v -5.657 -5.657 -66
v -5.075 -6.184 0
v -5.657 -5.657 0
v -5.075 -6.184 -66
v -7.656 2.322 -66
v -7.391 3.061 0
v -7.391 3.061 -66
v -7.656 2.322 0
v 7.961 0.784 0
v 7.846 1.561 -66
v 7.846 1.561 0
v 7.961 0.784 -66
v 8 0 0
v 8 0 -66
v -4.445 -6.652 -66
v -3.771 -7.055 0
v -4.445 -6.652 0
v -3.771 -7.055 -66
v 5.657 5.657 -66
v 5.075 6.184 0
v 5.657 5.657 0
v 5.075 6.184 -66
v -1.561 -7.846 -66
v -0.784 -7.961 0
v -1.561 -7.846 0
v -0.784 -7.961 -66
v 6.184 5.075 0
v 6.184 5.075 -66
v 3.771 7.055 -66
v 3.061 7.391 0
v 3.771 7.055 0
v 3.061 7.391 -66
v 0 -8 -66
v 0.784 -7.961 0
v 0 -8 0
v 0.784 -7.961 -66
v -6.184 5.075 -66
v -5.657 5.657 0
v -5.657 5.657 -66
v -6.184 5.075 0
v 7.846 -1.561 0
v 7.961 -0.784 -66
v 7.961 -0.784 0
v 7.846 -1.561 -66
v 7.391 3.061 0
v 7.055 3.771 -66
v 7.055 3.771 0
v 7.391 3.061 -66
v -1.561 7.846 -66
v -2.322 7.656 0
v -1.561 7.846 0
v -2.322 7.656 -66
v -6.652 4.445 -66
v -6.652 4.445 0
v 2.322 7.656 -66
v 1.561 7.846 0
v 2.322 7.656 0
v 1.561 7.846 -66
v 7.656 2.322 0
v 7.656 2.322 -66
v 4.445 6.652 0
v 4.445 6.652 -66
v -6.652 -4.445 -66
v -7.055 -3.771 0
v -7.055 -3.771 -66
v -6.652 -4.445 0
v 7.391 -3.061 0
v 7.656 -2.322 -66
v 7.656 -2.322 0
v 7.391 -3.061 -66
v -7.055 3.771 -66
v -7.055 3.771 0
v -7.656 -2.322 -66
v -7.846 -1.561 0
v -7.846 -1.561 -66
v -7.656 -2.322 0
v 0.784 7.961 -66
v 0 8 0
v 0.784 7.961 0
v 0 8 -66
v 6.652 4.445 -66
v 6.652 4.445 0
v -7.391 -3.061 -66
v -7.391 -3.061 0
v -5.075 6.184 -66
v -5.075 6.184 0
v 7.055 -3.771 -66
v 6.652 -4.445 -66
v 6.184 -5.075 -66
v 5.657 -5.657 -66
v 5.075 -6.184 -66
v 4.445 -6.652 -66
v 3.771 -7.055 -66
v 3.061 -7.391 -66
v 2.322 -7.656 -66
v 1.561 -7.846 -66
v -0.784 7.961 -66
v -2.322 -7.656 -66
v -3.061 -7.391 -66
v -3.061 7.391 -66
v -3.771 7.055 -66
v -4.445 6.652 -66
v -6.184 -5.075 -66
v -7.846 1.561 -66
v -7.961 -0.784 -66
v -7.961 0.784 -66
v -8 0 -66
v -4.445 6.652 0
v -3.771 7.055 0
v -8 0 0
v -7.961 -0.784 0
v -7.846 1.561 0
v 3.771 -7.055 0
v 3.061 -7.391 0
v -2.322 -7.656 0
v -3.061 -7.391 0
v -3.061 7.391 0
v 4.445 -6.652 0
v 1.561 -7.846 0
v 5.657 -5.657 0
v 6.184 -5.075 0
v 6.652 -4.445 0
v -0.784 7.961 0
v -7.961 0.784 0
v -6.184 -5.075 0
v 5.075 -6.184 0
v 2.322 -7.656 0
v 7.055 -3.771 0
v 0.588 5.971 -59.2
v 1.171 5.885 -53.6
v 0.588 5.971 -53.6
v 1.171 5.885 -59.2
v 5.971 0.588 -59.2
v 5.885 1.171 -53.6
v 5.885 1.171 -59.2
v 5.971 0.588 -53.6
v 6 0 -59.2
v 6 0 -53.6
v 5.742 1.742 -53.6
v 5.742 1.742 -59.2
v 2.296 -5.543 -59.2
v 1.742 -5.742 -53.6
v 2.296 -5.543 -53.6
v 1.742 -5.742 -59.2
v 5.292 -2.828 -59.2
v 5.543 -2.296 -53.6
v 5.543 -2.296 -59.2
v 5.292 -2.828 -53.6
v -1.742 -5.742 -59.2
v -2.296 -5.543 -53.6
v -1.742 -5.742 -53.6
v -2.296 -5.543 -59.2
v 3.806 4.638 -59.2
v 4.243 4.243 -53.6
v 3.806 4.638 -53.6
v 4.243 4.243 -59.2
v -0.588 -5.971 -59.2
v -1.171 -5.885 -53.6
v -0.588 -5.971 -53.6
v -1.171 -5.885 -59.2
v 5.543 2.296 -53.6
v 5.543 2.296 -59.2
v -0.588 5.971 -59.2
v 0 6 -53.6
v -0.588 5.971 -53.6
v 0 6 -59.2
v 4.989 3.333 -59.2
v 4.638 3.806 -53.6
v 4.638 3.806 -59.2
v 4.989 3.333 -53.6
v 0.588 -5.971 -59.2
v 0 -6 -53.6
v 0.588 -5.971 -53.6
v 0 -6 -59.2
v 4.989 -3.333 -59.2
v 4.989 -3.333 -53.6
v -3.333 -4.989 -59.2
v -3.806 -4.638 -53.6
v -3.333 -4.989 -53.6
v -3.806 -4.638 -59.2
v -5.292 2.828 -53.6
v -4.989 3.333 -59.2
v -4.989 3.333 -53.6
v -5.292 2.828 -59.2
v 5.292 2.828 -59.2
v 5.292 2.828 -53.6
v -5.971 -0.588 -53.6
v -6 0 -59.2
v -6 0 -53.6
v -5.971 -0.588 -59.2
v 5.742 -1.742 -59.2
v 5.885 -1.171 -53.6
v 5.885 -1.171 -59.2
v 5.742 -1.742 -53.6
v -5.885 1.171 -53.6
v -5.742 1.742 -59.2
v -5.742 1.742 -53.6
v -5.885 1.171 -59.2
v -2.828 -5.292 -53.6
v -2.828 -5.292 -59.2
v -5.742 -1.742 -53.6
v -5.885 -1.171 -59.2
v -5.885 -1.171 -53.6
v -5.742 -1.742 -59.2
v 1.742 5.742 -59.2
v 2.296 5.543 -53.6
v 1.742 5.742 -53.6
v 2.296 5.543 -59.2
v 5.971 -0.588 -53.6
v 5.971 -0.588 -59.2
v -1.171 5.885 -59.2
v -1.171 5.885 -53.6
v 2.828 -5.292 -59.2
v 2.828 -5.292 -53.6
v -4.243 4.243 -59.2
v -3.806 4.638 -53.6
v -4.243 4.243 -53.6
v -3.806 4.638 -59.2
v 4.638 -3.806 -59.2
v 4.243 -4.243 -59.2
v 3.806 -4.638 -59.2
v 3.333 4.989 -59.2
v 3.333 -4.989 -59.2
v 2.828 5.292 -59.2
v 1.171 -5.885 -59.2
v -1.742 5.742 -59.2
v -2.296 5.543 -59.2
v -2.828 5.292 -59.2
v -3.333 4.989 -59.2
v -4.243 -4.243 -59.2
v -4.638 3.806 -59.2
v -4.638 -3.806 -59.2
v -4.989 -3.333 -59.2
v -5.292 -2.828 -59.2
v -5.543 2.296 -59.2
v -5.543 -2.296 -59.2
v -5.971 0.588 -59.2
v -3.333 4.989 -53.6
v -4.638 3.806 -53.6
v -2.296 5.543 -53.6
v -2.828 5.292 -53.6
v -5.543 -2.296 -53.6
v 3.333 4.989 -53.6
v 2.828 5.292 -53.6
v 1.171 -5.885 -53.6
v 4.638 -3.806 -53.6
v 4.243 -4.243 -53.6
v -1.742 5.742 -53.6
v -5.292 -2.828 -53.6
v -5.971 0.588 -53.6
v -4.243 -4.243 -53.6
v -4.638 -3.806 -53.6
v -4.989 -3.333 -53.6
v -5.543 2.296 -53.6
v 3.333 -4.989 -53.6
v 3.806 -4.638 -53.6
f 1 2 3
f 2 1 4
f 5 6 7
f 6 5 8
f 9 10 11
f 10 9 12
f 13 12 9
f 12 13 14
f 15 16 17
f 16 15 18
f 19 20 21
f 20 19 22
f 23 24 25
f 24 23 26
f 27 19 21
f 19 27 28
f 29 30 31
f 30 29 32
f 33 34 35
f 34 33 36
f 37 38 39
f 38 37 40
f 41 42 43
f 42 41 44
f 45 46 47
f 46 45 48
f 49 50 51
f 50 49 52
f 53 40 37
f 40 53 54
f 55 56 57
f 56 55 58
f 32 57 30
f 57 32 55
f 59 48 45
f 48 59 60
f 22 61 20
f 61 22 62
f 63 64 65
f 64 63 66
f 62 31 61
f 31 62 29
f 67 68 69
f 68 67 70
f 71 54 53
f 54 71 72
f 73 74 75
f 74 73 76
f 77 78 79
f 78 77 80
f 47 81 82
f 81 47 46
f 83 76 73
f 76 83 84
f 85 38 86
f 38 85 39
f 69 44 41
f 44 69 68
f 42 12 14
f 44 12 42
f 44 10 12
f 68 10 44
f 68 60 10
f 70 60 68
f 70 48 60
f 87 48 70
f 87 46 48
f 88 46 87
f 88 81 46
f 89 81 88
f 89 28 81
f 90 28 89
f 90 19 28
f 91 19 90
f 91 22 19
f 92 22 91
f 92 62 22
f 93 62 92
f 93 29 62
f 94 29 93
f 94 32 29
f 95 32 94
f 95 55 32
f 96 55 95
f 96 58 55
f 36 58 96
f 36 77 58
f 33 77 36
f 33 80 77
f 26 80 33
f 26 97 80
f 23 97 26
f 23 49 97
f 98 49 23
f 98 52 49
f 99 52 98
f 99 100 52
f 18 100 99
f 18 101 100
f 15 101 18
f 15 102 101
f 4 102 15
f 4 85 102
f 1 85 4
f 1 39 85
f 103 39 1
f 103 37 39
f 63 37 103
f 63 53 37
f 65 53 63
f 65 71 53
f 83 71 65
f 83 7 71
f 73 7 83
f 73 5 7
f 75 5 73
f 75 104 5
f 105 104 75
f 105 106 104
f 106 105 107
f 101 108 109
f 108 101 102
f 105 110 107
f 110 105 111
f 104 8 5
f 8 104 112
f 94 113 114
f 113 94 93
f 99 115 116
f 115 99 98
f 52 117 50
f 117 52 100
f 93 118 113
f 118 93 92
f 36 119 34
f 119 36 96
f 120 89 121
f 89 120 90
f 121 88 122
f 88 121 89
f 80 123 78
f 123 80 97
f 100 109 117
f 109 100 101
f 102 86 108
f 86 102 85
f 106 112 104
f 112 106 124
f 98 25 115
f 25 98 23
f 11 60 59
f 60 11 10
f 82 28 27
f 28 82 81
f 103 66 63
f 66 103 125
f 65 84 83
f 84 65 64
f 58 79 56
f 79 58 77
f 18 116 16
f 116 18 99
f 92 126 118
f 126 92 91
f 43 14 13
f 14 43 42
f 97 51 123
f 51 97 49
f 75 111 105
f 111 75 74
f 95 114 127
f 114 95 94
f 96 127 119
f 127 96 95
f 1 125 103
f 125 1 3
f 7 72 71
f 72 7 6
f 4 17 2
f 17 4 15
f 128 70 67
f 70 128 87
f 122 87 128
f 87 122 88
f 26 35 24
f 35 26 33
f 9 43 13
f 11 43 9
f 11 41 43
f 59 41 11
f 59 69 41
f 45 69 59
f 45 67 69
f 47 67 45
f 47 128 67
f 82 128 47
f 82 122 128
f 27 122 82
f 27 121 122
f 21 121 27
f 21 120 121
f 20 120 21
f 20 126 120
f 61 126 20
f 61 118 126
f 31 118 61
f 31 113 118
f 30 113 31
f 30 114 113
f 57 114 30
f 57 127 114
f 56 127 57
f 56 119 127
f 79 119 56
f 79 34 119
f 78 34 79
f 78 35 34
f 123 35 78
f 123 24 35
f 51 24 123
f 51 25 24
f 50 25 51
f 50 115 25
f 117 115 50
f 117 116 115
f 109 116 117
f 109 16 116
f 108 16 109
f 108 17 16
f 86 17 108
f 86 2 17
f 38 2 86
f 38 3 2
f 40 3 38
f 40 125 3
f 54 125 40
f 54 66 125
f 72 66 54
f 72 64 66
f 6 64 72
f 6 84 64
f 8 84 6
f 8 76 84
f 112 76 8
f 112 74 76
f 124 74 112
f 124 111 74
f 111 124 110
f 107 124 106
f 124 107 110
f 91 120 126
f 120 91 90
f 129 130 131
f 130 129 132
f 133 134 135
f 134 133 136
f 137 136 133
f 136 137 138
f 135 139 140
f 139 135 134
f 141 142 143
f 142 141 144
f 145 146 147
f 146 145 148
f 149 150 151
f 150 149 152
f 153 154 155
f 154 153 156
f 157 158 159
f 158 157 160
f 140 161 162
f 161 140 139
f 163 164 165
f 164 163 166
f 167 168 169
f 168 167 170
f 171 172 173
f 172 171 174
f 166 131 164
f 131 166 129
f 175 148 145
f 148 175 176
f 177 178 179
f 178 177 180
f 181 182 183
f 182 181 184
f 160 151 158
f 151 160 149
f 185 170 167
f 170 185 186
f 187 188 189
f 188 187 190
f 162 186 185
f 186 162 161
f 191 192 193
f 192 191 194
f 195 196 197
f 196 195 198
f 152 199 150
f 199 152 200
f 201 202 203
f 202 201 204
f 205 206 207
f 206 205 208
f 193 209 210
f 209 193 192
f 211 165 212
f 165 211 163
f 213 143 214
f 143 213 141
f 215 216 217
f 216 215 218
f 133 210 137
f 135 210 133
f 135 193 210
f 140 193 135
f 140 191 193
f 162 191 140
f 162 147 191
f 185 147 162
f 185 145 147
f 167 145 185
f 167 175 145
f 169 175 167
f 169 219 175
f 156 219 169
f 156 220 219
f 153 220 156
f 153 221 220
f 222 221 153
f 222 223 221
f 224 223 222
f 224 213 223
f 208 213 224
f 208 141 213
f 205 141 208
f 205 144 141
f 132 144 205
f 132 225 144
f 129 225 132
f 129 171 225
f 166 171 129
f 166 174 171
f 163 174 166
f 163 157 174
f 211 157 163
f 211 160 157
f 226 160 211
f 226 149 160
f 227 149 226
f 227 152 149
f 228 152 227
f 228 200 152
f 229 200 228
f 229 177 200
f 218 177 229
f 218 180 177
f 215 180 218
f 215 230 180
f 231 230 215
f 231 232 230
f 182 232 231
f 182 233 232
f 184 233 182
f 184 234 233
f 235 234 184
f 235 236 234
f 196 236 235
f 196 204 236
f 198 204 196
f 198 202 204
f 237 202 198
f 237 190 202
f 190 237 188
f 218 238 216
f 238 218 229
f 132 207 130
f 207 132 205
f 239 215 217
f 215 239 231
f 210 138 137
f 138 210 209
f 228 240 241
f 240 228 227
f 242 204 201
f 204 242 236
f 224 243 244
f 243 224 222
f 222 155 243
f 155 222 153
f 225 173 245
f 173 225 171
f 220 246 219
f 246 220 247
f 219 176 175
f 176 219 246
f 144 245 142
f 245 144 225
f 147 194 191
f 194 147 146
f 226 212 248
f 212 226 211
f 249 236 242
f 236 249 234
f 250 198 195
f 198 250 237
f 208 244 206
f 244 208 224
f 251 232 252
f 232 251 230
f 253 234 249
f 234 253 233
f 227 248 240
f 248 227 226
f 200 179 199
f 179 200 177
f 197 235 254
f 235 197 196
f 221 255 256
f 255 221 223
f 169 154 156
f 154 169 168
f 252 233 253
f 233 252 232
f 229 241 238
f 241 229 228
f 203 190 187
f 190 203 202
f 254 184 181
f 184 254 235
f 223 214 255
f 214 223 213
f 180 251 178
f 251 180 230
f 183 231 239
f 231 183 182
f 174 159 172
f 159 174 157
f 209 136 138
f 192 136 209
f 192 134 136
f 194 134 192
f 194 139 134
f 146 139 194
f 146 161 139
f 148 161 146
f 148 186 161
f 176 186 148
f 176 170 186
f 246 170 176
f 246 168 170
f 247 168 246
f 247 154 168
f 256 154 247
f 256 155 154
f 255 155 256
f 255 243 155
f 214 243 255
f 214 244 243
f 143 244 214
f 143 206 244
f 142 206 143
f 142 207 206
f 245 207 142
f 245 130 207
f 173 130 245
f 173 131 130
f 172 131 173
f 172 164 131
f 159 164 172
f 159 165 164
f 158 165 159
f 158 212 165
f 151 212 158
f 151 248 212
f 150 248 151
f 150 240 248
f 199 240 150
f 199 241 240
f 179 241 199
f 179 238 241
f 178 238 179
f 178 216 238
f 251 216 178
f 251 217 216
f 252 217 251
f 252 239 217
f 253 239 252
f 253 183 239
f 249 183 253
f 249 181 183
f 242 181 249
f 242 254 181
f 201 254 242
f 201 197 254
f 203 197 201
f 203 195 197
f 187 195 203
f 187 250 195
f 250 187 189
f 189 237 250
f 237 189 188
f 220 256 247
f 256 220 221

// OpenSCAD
$fn = 64;

module hot_end_assembly() {
    difference() {
        // Overall cylinder for the hot-end assembly
        cylinder(h = 66, d = 16, center = true);

        // Create the mounting groove
        translate([0, 0, -33 + 6.8])
            cylinder(h = 5.6, d = 12, center = false);
    }
}

// Center the model near the origin
translate([0, 0, -33])
    hot_end_assembly();
